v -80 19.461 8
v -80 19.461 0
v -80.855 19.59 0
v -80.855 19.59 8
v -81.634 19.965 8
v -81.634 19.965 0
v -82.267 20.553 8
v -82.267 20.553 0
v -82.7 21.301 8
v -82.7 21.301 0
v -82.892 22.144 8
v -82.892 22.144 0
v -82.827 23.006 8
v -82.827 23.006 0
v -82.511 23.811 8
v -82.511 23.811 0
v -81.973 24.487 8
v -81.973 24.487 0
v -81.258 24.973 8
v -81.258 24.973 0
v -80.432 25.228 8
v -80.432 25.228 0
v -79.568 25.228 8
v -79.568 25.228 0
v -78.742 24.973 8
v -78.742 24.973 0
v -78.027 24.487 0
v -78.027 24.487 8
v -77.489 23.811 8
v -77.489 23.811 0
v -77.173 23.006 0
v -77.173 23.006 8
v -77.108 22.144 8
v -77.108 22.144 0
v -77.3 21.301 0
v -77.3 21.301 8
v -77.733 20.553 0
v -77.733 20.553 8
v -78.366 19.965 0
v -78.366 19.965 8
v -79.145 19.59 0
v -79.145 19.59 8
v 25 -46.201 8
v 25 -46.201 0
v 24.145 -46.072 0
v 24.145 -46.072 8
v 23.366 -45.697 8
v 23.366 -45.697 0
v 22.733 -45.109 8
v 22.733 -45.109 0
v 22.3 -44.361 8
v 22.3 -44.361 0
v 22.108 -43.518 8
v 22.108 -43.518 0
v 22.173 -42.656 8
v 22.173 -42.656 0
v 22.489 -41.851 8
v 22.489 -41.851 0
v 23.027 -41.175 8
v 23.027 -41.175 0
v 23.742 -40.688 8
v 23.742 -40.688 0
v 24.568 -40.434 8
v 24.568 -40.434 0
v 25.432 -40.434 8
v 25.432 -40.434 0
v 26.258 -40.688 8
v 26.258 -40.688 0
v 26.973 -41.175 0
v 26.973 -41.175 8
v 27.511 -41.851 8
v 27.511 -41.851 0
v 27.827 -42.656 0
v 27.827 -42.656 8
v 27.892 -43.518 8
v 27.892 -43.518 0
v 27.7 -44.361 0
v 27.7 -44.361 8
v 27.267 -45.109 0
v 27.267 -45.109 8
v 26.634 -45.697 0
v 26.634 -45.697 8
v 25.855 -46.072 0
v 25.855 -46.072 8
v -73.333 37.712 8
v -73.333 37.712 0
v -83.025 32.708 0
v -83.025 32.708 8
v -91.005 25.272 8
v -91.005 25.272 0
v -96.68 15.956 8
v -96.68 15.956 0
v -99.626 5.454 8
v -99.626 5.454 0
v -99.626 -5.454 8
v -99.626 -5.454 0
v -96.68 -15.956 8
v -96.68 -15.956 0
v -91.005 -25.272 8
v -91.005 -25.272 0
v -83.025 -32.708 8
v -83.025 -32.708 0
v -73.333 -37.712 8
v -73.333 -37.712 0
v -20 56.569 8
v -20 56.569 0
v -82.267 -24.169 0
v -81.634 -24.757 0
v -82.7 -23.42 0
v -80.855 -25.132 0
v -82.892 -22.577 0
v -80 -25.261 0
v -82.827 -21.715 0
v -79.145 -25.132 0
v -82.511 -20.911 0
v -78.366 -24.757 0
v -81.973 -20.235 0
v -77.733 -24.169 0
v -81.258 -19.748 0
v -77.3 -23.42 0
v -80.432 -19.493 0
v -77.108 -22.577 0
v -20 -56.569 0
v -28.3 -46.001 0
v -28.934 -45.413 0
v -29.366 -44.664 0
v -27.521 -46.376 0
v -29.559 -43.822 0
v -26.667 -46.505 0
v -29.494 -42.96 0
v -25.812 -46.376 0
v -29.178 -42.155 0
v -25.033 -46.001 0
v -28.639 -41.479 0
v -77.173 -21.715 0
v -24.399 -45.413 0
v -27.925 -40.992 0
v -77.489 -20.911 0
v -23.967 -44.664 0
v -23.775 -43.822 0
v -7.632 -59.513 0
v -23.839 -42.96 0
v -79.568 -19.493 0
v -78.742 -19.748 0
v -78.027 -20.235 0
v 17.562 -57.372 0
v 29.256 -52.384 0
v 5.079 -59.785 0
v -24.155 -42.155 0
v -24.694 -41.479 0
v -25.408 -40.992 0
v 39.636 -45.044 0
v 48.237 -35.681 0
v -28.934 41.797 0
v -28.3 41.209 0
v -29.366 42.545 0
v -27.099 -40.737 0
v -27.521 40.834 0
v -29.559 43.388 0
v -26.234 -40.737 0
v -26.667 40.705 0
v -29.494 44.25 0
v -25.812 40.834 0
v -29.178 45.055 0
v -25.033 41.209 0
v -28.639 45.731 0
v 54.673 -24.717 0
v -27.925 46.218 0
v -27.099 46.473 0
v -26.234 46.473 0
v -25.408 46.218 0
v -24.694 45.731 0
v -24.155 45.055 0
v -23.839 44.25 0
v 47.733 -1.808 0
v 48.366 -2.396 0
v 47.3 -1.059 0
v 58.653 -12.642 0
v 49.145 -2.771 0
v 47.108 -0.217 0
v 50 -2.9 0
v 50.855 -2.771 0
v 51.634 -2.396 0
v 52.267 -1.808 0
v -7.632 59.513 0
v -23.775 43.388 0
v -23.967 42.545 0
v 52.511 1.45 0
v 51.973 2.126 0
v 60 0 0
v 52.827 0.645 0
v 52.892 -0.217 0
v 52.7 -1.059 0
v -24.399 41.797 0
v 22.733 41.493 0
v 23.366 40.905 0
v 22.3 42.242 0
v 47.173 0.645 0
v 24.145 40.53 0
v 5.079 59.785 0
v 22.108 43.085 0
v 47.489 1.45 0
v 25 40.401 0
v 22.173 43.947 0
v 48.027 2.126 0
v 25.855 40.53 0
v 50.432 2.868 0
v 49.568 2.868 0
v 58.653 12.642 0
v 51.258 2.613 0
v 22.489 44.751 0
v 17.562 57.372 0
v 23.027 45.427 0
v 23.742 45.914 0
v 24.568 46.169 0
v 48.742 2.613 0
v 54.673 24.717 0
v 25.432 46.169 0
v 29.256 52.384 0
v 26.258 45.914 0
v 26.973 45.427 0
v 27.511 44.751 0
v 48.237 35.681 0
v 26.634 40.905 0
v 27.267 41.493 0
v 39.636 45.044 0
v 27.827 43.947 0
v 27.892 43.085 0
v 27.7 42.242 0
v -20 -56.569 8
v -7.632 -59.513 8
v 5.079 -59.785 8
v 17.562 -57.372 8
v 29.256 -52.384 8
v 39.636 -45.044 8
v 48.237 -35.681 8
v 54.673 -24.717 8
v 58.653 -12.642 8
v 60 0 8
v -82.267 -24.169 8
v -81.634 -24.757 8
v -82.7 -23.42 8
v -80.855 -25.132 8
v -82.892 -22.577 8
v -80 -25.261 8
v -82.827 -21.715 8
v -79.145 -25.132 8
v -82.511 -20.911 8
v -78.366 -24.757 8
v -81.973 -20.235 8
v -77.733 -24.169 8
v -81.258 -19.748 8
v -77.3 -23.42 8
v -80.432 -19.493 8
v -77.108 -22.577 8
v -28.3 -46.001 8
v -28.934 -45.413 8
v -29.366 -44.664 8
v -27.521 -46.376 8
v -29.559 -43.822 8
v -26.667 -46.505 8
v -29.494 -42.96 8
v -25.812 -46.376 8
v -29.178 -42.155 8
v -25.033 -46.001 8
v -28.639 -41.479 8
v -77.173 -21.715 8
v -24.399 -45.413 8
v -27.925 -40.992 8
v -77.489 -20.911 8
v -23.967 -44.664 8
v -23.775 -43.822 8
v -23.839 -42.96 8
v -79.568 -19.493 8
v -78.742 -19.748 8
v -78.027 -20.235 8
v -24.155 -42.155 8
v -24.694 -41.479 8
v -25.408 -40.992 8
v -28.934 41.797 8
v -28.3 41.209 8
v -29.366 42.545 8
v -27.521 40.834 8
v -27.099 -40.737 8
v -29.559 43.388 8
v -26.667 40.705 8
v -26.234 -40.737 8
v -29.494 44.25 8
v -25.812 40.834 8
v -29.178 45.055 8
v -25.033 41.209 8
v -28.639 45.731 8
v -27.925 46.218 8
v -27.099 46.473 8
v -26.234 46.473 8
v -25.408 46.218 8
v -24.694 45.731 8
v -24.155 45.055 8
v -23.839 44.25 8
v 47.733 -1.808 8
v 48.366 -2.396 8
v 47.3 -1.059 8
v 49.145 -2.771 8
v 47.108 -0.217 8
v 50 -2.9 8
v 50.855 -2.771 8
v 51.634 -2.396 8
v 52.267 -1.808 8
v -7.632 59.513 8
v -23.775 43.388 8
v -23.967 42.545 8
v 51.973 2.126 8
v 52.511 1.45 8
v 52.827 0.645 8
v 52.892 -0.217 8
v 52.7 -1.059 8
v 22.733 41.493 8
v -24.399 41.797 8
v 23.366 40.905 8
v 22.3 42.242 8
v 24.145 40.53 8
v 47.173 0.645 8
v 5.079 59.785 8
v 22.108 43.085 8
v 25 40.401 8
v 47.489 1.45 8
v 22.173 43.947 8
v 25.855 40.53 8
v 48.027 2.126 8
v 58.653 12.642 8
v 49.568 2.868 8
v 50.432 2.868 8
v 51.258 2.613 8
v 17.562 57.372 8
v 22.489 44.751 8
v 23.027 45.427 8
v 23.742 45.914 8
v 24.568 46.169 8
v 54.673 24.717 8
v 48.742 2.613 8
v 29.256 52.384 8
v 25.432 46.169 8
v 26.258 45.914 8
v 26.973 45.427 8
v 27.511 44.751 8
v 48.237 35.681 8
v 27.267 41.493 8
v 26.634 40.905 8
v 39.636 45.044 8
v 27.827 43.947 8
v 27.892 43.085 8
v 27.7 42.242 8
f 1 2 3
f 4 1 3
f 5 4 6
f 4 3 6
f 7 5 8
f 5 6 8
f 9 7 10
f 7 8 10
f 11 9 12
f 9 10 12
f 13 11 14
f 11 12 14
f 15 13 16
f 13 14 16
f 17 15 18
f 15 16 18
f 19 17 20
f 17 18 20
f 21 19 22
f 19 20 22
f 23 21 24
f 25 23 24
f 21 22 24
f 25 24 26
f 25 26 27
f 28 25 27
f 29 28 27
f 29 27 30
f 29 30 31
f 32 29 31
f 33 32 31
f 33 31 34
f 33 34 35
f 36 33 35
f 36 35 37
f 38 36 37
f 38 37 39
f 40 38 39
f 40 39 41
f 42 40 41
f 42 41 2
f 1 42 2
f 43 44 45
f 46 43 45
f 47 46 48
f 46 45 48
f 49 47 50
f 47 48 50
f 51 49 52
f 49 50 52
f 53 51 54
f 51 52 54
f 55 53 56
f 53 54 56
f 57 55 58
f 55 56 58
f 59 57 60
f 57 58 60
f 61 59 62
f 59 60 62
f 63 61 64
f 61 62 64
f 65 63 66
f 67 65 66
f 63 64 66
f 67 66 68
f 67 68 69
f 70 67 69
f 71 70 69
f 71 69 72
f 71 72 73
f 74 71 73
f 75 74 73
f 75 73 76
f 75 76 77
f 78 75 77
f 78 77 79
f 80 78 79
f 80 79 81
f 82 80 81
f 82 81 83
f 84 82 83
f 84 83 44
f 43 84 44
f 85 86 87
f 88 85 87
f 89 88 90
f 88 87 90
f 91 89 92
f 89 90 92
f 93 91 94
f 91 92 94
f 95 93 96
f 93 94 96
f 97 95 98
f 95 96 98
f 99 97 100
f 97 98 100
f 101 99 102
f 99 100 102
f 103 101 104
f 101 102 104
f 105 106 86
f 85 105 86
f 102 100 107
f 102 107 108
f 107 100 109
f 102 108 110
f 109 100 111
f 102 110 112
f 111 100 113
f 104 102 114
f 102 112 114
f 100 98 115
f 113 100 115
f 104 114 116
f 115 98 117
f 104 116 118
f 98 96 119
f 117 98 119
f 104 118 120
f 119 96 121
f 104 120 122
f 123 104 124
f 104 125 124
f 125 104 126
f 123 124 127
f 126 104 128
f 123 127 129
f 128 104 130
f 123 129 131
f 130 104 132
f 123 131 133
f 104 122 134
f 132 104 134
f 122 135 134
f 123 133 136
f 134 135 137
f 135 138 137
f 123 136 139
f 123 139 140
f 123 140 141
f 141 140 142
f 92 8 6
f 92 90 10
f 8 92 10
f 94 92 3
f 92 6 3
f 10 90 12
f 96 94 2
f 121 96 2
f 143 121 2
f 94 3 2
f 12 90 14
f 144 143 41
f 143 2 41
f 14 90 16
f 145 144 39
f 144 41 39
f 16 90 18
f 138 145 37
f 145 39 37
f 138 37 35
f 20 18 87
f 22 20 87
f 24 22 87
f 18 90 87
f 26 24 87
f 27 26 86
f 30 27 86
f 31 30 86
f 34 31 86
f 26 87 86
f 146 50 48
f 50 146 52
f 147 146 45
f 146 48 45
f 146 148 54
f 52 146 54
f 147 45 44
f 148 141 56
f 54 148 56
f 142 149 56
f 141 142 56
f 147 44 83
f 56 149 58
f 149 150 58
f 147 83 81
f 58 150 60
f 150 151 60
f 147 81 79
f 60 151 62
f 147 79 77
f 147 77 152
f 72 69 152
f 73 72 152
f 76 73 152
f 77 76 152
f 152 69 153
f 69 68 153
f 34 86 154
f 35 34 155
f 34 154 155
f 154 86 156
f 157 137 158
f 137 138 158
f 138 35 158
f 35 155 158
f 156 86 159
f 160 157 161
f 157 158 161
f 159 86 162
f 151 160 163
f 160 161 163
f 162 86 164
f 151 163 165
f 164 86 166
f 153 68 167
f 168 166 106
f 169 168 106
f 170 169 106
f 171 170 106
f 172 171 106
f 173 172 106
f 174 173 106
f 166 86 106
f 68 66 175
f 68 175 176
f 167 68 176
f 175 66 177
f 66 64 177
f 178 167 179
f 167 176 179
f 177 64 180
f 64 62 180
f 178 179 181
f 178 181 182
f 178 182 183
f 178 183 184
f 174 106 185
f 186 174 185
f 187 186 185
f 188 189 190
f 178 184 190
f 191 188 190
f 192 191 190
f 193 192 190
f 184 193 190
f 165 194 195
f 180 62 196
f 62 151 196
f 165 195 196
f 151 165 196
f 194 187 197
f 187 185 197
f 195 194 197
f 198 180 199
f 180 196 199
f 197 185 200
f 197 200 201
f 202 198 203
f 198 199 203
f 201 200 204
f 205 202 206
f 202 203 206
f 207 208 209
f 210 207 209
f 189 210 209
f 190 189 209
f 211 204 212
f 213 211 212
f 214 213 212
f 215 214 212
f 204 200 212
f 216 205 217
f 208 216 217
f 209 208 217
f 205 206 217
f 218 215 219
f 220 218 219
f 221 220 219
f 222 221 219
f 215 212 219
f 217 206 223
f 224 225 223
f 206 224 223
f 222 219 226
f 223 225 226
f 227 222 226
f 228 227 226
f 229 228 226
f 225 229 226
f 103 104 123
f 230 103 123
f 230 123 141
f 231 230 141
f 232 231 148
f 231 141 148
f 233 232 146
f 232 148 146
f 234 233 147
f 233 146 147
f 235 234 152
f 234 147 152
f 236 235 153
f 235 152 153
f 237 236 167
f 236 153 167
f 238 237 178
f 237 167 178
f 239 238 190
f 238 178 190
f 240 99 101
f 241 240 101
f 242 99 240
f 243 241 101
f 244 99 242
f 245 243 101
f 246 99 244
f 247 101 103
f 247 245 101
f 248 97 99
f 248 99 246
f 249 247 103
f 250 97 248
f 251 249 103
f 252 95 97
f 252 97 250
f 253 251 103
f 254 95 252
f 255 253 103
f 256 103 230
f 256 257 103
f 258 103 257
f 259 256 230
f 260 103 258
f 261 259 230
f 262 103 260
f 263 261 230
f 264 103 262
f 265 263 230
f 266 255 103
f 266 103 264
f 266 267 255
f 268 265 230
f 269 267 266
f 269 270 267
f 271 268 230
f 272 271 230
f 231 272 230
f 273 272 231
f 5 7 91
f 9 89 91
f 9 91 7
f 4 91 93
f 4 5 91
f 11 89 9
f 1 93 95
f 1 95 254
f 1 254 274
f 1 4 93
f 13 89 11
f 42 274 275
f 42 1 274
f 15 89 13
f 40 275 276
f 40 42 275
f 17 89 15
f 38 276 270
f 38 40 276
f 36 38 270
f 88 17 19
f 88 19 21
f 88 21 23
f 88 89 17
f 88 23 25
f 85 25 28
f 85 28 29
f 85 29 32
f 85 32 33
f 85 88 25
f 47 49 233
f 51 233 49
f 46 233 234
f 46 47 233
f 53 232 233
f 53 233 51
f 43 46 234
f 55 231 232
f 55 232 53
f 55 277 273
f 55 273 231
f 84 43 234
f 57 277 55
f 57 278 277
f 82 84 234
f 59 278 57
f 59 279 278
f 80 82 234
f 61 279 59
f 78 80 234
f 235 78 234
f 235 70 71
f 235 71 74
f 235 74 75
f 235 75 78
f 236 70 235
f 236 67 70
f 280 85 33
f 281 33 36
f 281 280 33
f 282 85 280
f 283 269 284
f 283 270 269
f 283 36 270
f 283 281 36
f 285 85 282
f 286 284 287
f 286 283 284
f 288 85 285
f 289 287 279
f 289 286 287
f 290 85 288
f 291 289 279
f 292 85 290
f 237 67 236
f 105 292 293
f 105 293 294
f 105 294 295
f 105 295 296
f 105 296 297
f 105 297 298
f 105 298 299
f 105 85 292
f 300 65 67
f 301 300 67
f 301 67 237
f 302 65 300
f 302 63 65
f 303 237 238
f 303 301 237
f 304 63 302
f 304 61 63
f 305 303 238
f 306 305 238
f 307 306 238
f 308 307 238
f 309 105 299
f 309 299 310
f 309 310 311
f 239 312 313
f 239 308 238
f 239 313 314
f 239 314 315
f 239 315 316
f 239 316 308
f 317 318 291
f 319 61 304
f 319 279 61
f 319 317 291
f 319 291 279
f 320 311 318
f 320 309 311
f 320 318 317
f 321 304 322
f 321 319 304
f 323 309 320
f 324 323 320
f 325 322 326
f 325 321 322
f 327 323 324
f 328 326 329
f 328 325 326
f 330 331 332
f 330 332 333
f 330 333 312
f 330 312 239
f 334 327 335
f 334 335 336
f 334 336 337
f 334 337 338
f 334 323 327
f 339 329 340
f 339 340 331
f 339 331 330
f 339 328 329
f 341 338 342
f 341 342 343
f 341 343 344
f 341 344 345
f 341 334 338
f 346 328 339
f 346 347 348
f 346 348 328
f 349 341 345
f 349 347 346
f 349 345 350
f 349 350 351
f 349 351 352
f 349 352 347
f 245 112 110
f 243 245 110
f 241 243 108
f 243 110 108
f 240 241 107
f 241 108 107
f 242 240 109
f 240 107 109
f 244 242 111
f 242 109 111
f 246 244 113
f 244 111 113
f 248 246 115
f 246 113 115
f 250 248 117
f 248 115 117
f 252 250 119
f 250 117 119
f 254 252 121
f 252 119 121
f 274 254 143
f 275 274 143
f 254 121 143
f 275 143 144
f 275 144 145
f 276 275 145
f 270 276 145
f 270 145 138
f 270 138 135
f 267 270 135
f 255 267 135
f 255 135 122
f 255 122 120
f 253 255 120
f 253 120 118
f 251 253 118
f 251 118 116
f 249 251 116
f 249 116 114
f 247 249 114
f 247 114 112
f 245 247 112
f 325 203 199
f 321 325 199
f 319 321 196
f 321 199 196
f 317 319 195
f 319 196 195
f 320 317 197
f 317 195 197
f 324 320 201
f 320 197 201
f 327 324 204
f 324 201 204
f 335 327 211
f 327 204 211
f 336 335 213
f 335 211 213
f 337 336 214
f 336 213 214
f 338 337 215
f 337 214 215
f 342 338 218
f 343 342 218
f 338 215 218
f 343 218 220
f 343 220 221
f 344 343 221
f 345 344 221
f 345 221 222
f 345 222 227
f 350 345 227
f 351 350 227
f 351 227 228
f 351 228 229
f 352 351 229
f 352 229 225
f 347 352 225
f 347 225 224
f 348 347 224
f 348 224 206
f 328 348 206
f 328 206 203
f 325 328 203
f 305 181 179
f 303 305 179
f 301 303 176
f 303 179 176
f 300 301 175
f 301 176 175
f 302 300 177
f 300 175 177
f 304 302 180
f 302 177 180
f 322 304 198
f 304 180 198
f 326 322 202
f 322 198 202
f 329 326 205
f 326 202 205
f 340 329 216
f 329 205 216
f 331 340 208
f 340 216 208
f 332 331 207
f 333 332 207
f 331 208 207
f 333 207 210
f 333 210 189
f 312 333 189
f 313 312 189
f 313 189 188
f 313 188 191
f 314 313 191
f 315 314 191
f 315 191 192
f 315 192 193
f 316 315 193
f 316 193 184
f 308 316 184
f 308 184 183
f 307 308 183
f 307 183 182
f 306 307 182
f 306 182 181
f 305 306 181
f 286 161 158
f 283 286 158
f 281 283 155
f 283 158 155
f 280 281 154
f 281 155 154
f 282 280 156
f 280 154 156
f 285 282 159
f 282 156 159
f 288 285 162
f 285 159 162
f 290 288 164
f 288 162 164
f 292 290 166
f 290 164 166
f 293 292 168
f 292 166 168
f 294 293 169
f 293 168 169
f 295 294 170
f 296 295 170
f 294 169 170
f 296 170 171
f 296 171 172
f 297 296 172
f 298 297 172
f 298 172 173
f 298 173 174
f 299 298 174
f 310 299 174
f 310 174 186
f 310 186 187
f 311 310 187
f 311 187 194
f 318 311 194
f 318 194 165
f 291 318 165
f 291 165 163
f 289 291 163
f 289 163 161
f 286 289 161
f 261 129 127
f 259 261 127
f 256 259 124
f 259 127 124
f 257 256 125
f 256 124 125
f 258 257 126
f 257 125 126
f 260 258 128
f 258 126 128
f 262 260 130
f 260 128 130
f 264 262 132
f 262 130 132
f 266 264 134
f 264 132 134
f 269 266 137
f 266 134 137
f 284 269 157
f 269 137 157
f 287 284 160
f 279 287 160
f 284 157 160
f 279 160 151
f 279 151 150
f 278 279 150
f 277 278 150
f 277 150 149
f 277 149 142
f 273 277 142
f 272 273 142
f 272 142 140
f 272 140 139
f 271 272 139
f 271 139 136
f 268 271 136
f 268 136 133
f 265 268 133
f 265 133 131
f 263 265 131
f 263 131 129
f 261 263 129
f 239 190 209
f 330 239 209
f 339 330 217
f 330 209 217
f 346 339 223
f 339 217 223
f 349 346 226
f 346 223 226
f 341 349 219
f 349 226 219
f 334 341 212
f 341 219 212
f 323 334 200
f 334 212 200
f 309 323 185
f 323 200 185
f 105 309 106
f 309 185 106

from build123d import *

# Parameters (mm, degrees)
BOSS_EXTRU_1_DEPTH   = 8
D_GAGEMENT_M52_D     = 5.8
D_GAGEMENT_M52_DEPTH = 90
D_GAGEMENT_M52_TIP   = 1.742495795


with BuildPart() as part:
    # Esquisse1 → Boss.-Extru.1 (new body)
    with BuildSketch(Plane.XY):
        with BuildLine():
            Line((-20, 56.568542495), (-73.333333333, 37.712361663))
            ThreePointArc((-73.333333333, 37.712361663), (-100, 0), (-73.333333333, -37.712361663))
            Line((-73.333333333, -37.712361663), (-20, -56.568542495))
            ThreePointArc((-20, -56.568542495), (34.641016151, -48.989794856), (60, 0))
            ThreePointArc((60, 0), (34.641016151, 48.989794856), (-20, 56.568542495))
        make_face()
    extrude(amount=BOSS_EXTRU_1_DEPTH)

    # Dégagement M52
    with Locations(Plane(origin=(15, 0, 8), x_dir=(0, 1, 0), z_dir=(0, 0, 1))):
        with Locations((43.604918173, 41.666666667), (0, -35), (-43.301270189, -10), (43.301270189, -10), (-22.360679775, 95), (22.360679775, 95), (-43.604918173, 41.666666667)):
            Hole(D_GAGEMENT_M52_D / 2, depth=D_GAGEMENT_M52_DEPTH)
            with Locations((0, 0, -(D_GAGEMENT_M52_DEPTH + D_GAGEMENT_M52_TIP / 2))):  # 118° drill point
                Cone(0, D_GAGEMENT_M52_D / 2, D_GAGEMENT_M52_TIP, mode=Mode.SUBTRACT)


solid = part.part
